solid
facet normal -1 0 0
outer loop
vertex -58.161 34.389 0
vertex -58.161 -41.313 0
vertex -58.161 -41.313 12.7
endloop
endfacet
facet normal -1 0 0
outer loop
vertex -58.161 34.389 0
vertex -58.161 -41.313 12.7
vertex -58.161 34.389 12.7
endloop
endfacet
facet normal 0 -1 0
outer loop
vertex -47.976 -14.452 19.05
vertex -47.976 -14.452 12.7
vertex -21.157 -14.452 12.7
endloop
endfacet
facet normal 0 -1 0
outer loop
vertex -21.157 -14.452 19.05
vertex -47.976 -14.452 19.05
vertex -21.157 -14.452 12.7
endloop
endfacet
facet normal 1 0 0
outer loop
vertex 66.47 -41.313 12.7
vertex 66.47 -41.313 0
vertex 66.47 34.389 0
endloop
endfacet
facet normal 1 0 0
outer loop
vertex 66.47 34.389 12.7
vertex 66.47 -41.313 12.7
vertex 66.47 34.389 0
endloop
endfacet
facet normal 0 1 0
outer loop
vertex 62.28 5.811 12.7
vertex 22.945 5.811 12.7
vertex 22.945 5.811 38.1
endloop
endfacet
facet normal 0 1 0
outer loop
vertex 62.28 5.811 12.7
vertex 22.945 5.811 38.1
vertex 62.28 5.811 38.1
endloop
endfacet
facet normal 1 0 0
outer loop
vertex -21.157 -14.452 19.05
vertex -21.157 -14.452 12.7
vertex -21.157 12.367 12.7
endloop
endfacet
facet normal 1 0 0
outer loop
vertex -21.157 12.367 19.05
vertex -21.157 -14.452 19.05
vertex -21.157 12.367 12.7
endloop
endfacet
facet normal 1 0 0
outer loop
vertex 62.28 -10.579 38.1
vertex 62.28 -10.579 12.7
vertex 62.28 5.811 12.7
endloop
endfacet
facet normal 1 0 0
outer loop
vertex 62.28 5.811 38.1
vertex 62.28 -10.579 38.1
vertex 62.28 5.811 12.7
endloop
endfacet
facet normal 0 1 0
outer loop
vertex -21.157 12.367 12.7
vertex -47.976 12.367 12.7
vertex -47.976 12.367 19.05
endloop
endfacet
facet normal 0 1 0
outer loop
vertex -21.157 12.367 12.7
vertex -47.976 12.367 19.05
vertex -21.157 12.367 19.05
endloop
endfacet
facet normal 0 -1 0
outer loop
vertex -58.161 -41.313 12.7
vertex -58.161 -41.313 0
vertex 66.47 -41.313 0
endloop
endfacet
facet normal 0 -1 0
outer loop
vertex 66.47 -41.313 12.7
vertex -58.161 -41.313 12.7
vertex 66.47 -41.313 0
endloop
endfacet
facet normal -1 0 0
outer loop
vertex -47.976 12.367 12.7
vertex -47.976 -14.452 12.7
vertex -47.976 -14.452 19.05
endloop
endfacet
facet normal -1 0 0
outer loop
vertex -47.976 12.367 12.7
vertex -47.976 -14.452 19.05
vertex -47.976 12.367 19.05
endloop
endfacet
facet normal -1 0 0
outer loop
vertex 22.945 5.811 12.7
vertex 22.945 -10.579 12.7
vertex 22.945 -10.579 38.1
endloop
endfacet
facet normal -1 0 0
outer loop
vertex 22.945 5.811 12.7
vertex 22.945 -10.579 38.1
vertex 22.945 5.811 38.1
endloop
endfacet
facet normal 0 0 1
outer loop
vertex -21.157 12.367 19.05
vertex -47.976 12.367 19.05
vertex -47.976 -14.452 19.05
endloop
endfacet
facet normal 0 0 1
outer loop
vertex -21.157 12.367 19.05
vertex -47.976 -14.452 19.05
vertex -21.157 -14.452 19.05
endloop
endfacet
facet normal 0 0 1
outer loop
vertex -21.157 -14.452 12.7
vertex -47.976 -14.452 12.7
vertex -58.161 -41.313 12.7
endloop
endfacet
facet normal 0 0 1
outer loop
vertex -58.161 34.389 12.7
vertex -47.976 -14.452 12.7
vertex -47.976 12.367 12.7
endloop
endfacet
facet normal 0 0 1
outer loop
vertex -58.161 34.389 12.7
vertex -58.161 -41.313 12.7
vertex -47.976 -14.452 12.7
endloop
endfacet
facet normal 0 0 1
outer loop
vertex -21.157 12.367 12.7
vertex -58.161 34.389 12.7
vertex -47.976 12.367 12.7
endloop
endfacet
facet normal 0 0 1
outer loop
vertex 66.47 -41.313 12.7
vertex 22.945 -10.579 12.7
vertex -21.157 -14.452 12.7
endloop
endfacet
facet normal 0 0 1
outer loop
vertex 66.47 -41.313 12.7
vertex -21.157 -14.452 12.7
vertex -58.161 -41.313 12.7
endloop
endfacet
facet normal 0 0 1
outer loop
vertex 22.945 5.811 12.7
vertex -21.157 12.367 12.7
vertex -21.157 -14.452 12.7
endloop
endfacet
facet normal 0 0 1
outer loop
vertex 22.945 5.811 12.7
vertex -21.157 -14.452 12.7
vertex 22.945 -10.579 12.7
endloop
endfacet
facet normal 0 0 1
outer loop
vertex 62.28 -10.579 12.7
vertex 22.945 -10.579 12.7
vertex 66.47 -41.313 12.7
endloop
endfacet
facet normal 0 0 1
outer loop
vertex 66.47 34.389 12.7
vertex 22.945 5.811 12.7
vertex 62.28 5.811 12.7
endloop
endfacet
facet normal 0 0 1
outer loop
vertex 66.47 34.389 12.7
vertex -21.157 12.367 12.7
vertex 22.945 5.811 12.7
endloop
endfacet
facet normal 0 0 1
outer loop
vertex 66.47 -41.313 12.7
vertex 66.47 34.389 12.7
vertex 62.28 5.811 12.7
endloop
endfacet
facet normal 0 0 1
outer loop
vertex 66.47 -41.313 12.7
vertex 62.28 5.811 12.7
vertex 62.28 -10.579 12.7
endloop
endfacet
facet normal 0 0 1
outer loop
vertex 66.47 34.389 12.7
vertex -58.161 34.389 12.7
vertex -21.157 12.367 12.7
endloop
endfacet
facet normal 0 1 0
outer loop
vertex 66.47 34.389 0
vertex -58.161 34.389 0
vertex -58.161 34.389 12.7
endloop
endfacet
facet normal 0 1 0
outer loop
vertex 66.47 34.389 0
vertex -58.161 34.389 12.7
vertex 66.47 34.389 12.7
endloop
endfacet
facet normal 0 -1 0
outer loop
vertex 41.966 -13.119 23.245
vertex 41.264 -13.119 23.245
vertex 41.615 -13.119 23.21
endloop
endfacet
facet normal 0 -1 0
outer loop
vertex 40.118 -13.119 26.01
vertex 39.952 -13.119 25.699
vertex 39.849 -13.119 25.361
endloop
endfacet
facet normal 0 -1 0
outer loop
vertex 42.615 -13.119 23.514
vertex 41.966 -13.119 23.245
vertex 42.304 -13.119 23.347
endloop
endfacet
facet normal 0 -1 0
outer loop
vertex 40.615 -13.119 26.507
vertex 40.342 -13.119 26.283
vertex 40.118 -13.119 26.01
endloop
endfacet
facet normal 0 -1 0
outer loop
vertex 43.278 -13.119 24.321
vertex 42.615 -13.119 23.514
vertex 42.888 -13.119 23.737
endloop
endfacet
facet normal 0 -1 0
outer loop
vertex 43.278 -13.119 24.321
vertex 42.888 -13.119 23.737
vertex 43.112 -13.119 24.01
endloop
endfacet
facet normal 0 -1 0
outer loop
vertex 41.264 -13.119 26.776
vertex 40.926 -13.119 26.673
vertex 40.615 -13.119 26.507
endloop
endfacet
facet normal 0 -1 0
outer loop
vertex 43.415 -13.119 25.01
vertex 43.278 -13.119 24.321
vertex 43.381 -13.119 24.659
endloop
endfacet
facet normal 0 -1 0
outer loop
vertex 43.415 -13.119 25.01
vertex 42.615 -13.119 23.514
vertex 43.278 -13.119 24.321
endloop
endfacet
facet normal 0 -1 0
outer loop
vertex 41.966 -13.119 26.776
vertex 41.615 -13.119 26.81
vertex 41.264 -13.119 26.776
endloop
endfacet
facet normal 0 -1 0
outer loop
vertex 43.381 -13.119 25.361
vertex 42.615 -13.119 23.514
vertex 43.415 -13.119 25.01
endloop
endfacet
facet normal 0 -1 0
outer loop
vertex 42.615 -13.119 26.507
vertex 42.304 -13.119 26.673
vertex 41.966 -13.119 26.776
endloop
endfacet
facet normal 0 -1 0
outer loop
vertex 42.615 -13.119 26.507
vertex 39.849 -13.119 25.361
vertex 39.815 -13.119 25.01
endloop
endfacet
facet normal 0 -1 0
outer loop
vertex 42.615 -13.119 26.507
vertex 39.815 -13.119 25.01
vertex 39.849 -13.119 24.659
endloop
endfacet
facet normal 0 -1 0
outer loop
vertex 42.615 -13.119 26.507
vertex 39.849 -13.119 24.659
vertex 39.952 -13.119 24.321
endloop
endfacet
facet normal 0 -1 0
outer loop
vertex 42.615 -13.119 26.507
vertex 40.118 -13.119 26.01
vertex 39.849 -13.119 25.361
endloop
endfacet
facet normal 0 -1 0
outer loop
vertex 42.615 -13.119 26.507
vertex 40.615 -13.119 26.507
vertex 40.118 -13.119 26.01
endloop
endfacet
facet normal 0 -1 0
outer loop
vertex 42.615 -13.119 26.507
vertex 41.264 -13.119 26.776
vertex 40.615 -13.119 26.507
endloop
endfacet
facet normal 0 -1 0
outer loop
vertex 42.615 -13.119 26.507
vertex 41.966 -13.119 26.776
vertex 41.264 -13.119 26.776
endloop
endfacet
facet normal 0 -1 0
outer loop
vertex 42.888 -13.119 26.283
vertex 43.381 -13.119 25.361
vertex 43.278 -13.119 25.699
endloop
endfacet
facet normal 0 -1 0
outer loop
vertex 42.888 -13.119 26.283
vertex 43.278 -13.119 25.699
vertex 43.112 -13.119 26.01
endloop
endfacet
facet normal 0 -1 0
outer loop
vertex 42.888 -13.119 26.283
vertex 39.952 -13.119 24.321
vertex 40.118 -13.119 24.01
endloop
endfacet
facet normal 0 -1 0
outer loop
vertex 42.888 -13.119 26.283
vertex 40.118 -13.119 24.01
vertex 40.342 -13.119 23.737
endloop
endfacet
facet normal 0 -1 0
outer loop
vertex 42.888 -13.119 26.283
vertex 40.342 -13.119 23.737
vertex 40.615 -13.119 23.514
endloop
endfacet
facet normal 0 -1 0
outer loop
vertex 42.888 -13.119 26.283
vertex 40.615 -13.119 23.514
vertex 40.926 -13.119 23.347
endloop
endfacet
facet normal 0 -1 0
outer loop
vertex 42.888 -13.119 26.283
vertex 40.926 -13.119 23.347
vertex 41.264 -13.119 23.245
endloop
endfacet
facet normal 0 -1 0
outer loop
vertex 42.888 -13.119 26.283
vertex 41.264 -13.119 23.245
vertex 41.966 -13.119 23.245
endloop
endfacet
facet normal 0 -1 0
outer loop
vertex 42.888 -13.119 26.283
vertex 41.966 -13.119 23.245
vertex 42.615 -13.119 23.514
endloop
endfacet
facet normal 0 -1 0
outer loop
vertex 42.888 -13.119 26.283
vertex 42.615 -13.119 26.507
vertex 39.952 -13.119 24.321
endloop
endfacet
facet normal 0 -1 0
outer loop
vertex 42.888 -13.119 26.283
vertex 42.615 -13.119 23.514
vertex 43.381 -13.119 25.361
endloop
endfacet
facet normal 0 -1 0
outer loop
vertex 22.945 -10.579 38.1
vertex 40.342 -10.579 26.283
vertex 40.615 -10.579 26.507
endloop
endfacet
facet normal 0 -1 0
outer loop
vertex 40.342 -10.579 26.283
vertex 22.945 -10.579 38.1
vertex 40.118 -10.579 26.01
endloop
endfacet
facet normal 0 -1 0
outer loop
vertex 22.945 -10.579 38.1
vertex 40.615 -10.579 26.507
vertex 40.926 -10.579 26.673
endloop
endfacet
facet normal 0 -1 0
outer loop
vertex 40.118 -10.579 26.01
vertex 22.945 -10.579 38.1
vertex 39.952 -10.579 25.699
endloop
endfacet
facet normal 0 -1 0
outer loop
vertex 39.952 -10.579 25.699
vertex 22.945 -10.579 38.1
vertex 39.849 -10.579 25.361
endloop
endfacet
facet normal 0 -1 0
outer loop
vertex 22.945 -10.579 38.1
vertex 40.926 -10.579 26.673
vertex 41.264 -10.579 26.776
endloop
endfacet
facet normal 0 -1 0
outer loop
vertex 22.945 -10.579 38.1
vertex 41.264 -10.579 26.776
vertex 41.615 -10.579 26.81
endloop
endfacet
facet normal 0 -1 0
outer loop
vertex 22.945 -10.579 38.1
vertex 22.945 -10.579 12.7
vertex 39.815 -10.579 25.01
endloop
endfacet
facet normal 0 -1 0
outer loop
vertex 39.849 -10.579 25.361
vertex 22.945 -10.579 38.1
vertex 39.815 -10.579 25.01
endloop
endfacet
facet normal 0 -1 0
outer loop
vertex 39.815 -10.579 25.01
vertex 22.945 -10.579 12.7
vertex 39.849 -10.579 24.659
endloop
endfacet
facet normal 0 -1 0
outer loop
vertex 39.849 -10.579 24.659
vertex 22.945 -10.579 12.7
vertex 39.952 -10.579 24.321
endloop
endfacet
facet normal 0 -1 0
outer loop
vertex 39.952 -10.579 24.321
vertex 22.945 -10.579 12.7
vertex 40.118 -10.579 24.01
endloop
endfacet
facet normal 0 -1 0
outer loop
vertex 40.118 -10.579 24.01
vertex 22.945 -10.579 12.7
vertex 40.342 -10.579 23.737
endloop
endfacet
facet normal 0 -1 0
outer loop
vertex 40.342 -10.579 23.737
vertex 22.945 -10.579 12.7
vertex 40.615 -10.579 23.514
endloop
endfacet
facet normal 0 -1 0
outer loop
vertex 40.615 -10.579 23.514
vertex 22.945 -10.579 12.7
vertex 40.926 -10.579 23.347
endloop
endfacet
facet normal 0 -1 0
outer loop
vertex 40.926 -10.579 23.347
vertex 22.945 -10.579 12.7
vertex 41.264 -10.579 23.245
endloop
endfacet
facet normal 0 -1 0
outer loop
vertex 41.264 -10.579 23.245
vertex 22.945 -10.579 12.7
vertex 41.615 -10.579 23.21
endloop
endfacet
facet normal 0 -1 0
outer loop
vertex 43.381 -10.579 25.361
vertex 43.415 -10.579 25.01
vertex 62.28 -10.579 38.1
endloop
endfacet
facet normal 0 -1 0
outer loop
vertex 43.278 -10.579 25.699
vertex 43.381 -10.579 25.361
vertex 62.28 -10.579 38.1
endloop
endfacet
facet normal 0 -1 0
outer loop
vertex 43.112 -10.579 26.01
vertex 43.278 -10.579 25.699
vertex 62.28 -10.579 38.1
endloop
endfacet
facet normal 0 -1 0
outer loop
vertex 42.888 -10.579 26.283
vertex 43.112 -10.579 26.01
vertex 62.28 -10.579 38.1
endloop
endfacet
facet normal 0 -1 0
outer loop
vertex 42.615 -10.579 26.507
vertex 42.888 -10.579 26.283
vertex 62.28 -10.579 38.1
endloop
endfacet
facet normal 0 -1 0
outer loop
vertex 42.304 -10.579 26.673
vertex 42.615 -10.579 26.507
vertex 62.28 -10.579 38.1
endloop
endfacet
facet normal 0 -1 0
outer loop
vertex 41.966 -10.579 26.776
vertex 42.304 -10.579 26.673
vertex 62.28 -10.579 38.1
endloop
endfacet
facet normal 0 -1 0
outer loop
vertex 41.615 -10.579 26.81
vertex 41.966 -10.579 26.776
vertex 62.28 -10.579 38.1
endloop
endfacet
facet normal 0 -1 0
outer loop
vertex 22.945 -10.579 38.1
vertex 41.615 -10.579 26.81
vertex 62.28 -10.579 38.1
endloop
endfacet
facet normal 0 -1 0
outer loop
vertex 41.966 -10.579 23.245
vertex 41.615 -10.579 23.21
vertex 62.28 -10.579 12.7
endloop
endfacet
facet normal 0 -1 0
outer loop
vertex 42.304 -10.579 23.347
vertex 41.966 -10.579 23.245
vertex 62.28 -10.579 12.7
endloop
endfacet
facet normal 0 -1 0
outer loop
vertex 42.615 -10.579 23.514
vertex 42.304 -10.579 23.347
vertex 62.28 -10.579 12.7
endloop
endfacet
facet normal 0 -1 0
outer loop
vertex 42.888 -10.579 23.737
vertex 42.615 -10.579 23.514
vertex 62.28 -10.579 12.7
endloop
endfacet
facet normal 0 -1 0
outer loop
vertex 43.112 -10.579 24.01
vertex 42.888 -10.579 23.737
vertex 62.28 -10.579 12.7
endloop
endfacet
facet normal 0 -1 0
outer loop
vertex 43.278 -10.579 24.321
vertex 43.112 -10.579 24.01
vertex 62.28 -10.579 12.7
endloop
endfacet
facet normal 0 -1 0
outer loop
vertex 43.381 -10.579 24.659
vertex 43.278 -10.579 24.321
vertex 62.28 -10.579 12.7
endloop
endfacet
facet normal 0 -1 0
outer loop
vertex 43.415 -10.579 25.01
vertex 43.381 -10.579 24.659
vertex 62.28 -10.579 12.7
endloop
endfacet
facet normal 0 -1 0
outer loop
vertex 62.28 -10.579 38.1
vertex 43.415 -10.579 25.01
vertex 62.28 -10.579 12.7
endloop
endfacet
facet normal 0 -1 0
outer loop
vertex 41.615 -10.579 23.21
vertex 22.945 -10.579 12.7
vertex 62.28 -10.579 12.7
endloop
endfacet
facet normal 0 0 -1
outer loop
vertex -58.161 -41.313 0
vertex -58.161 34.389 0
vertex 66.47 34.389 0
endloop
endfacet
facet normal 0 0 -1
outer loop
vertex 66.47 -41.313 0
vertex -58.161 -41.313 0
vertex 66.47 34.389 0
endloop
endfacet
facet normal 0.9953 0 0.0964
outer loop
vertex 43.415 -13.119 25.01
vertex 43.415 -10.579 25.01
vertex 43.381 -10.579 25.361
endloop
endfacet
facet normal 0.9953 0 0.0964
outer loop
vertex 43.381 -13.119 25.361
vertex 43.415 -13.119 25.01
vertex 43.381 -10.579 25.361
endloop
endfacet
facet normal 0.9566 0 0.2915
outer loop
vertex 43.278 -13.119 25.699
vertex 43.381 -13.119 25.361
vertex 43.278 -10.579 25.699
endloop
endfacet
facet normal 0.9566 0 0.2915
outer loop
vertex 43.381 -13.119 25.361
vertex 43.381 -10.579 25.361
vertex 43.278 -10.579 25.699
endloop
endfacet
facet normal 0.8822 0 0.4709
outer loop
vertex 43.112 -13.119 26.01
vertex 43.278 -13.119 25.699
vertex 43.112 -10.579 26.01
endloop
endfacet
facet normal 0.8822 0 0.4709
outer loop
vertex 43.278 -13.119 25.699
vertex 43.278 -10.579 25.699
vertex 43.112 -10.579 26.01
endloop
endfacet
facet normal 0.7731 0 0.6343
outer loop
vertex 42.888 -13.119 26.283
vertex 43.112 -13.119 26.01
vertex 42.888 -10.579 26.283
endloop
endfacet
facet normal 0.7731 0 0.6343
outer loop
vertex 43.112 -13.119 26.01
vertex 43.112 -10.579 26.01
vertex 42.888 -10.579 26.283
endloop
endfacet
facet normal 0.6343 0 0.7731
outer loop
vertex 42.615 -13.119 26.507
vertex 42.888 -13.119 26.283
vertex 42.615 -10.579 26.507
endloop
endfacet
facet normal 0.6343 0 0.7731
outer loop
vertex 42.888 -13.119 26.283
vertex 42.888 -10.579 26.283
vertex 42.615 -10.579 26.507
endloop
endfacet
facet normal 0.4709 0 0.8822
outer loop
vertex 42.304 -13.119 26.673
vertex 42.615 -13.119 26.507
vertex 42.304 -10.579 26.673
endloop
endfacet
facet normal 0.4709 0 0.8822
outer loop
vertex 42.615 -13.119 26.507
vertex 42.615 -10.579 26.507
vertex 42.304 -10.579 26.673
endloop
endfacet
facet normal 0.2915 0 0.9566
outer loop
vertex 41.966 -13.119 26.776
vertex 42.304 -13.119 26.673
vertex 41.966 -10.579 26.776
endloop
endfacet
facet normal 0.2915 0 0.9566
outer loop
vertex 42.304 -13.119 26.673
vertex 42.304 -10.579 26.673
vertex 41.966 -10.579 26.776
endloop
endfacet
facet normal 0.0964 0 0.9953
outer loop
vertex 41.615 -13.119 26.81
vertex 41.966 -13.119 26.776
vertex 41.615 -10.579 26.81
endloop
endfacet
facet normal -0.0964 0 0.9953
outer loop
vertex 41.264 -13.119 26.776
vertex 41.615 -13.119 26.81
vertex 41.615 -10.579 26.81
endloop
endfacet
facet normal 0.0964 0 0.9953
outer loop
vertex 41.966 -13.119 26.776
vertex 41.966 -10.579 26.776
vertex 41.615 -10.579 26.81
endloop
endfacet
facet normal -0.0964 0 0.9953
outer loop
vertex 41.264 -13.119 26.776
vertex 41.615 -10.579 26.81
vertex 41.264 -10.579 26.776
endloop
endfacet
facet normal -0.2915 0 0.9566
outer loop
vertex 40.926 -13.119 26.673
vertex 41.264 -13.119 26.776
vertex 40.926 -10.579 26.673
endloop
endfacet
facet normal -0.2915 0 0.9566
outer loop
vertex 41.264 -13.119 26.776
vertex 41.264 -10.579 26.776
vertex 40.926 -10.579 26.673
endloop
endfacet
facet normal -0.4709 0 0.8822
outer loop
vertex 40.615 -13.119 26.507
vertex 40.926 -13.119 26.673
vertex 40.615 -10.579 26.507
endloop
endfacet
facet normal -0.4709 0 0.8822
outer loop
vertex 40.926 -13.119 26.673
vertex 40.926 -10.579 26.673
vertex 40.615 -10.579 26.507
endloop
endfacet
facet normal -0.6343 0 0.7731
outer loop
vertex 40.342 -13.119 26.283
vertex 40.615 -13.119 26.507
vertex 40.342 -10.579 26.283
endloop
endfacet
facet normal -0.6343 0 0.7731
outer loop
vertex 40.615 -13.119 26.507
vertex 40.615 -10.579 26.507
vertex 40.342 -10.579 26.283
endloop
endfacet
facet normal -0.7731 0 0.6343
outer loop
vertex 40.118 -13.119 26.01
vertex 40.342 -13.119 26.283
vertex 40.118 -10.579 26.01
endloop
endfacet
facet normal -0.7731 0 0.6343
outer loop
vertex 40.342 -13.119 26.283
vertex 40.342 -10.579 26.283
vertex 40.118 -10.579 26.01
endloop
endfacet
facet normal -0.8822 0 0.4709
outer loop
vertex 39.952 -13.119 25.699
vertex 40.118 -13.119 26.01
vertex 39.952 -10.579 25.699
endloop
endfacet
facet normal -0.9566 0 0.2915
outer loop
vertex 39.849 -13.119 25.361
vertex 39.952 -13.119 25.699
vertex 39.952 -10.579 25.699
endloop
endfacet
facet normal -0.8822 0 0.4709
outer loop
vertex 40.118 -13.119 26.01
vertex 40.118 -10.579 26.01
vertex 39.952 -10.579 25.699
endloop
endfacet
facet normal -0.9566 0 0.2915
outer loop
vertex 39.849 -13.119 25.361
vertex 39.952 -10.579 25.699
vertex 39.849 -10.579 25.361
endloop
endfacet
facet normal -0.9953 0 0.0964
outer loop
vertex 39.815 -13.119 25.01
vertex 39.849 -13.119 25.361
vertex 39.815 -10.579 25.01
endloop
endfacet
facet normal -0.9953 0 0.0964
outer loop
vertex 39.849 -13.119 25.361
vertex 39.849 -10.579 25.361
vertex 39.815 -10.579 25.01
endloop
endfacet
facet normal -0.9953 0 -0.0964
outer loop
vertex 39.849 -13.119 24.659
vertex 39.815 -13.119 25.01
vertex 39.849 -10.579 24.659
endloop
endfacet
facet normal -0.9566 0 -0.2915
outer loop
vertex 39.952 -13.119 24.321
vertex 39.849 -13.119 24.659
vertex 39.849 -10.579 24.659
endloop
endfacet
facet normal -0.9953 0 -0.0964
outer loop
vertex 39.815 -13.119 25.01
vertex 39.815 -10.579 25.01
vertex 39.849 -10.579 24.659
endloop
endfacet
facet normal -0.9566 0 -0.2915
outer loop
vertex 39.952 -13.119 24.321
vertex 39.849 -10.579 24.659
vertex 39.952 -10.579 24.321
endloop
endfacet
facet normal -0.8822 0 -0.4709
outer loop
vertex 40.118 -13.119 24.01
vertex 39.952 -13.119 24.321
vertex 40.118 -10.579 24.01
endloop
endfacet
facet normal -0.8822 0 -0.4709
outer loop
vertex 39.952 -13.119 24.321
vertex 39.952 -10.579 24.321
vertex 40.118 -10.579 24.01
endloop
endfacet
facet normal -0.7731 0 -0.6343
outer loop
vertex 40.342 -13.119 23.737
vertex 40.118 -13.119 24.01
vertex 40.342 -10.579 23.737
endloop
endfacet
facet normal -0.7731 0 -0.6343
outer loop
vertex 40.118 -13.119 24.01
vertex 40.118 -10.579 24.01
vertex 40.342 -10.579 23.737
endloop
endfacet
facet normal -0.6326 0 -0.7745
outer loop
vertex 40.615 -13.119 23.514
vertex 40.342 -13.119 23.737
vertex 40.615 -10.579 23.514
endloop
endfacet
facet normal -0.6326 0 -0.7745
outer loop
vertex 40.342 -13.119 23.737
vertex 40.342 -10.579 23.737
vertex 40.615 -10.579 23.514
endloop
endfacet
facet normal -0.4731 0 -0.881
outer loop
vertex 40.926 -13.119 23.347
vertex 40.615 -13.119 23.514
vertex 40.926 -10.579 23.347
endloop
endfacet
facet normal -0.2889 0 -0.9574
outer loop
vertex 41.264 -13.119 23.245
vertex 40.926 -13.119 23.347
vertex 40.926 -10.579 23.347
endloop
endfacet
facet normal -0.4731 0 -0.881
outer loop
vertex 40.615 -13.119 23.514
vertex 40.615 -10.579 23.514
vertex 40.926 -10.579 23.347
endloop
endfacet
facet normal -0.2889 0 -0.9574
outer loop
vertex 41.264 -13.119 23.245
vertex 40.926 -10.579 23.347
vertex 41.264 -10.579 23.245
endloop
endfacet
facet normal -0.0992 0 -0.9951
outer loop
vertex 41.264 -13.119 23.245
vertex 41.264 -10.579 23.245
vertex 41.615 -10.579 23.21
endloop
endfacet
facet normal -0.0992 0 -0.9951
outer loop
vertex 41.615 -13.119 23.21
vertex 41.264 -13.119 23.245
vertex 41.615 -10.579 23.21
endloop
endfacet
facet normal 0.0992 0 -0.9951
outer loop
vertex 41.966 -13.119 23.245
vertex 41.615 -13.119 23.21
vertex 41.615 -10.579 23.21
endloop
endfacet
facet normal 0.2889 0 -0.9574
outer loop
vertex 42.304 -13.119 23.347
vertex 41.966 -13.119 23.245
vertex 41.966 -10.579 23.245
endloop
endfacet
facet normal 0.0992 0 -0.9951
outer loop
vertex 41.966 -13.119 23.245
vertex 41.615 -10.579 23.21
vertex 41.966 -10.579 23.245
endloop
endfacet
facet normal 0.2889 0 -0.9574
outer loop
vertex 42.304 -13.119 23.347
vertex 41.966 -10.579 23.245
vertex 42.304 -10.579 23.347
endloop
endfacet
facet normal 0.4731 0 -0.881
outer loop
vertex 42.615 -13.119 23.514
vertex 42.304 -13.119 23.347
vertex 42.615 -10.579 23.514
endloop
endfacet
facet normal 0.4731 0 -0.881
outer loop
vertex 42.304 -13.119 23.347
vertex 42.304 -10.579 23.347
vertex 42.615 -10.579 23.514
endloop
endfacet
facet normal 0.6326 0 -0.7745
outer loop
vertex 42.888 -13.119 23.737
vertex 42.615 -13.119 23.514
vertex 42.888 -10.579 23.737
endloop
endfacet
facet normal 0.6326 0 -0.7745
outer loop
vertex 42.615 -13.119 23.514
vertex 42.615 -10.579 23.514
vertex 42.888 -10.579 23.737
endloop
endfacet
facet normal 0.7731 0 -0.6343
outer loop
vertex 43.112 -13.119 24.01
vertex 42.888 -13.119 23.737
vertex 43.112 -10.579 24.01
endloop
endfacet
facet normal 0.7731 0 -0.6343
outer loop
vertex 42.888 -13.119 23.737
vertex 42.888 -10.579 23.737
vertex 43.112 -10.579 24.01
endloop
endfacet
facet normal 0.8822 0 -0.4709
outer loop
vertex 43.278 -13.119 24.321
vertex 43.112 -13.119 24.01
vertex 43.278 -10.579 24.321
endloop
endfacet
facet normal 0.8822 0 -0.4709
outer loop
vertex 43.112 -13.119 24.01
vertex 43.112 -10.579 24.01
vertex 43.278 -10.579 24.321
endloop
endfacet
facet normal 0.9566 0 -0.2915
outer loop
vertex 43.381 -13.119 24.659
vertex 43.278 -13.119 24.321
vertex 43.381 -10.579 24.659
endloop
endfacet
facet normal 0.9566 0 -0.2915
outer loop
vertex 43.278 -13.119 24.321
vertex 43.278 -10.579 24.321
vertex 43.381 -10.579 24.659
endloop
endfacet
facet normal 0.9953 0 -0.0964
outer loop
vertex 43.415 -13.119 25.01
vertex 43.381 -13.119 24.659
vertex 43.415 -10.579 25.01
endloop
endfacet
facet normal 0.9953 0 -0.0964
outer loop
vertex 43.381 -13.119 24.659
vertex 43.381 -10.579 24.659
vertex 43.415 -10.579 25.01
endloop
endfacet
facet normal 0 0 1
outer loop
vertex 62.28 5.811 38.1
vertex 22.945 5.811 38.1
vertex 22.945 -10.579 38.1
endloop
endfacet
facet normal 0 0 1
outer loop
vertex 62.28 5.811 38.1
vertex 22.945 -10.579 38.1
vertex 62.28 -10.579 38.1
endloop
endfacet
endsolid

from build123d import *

# Parameters (mm, degrees)
F0_W     = 124.630935
F0_H     = 75.701751
F1_DEPTH = 12.7
F2_W     = 39.33452
F2_H     = 16.389386
F3_DEPTH = 25.4
F4_W     = 26.818996
F4_H     = 26.818994
F5_DEPTH = 6.35
F6_R     = 1.800148
F7_DEPTH = 2.54


with BuildPart() as f1:
    # F0 (on Top) → F1 (new body)
    with BuildSketch(Plane.XY):
        with Locations((4.154365, -3.461972)):
            Rectangle(F0_W, F0_H)
    extrude(amount=F1_DEPTH)

    # F2 (on face) → F3 (join)
    with BuildSketch(Plane.XY.offset(12.7)):
        with Locations((42.6124, -2.383911)):
            Rectangle(F2_W, F2_H)
    extrude(amount=F3_DEPTH)

    # F4 (on face) → F5 (join)
    with BuildSketch(Plane.XY.offset(12.7)):
        with Locations((-34.566705, -1.042961)):
            Rectangle(F4_W, F4_H)
    extrude(amount=F5_DEPTH)

    # F6 (on face) → F7 (join)
    with BuildSketch(Plane.XZ.offset(10.578604)):
        with Locations((41.615058, 25.010286)):
            Circle(F6_R)
    extrude(amount=F7_DEPTH)


solid = f1.part
